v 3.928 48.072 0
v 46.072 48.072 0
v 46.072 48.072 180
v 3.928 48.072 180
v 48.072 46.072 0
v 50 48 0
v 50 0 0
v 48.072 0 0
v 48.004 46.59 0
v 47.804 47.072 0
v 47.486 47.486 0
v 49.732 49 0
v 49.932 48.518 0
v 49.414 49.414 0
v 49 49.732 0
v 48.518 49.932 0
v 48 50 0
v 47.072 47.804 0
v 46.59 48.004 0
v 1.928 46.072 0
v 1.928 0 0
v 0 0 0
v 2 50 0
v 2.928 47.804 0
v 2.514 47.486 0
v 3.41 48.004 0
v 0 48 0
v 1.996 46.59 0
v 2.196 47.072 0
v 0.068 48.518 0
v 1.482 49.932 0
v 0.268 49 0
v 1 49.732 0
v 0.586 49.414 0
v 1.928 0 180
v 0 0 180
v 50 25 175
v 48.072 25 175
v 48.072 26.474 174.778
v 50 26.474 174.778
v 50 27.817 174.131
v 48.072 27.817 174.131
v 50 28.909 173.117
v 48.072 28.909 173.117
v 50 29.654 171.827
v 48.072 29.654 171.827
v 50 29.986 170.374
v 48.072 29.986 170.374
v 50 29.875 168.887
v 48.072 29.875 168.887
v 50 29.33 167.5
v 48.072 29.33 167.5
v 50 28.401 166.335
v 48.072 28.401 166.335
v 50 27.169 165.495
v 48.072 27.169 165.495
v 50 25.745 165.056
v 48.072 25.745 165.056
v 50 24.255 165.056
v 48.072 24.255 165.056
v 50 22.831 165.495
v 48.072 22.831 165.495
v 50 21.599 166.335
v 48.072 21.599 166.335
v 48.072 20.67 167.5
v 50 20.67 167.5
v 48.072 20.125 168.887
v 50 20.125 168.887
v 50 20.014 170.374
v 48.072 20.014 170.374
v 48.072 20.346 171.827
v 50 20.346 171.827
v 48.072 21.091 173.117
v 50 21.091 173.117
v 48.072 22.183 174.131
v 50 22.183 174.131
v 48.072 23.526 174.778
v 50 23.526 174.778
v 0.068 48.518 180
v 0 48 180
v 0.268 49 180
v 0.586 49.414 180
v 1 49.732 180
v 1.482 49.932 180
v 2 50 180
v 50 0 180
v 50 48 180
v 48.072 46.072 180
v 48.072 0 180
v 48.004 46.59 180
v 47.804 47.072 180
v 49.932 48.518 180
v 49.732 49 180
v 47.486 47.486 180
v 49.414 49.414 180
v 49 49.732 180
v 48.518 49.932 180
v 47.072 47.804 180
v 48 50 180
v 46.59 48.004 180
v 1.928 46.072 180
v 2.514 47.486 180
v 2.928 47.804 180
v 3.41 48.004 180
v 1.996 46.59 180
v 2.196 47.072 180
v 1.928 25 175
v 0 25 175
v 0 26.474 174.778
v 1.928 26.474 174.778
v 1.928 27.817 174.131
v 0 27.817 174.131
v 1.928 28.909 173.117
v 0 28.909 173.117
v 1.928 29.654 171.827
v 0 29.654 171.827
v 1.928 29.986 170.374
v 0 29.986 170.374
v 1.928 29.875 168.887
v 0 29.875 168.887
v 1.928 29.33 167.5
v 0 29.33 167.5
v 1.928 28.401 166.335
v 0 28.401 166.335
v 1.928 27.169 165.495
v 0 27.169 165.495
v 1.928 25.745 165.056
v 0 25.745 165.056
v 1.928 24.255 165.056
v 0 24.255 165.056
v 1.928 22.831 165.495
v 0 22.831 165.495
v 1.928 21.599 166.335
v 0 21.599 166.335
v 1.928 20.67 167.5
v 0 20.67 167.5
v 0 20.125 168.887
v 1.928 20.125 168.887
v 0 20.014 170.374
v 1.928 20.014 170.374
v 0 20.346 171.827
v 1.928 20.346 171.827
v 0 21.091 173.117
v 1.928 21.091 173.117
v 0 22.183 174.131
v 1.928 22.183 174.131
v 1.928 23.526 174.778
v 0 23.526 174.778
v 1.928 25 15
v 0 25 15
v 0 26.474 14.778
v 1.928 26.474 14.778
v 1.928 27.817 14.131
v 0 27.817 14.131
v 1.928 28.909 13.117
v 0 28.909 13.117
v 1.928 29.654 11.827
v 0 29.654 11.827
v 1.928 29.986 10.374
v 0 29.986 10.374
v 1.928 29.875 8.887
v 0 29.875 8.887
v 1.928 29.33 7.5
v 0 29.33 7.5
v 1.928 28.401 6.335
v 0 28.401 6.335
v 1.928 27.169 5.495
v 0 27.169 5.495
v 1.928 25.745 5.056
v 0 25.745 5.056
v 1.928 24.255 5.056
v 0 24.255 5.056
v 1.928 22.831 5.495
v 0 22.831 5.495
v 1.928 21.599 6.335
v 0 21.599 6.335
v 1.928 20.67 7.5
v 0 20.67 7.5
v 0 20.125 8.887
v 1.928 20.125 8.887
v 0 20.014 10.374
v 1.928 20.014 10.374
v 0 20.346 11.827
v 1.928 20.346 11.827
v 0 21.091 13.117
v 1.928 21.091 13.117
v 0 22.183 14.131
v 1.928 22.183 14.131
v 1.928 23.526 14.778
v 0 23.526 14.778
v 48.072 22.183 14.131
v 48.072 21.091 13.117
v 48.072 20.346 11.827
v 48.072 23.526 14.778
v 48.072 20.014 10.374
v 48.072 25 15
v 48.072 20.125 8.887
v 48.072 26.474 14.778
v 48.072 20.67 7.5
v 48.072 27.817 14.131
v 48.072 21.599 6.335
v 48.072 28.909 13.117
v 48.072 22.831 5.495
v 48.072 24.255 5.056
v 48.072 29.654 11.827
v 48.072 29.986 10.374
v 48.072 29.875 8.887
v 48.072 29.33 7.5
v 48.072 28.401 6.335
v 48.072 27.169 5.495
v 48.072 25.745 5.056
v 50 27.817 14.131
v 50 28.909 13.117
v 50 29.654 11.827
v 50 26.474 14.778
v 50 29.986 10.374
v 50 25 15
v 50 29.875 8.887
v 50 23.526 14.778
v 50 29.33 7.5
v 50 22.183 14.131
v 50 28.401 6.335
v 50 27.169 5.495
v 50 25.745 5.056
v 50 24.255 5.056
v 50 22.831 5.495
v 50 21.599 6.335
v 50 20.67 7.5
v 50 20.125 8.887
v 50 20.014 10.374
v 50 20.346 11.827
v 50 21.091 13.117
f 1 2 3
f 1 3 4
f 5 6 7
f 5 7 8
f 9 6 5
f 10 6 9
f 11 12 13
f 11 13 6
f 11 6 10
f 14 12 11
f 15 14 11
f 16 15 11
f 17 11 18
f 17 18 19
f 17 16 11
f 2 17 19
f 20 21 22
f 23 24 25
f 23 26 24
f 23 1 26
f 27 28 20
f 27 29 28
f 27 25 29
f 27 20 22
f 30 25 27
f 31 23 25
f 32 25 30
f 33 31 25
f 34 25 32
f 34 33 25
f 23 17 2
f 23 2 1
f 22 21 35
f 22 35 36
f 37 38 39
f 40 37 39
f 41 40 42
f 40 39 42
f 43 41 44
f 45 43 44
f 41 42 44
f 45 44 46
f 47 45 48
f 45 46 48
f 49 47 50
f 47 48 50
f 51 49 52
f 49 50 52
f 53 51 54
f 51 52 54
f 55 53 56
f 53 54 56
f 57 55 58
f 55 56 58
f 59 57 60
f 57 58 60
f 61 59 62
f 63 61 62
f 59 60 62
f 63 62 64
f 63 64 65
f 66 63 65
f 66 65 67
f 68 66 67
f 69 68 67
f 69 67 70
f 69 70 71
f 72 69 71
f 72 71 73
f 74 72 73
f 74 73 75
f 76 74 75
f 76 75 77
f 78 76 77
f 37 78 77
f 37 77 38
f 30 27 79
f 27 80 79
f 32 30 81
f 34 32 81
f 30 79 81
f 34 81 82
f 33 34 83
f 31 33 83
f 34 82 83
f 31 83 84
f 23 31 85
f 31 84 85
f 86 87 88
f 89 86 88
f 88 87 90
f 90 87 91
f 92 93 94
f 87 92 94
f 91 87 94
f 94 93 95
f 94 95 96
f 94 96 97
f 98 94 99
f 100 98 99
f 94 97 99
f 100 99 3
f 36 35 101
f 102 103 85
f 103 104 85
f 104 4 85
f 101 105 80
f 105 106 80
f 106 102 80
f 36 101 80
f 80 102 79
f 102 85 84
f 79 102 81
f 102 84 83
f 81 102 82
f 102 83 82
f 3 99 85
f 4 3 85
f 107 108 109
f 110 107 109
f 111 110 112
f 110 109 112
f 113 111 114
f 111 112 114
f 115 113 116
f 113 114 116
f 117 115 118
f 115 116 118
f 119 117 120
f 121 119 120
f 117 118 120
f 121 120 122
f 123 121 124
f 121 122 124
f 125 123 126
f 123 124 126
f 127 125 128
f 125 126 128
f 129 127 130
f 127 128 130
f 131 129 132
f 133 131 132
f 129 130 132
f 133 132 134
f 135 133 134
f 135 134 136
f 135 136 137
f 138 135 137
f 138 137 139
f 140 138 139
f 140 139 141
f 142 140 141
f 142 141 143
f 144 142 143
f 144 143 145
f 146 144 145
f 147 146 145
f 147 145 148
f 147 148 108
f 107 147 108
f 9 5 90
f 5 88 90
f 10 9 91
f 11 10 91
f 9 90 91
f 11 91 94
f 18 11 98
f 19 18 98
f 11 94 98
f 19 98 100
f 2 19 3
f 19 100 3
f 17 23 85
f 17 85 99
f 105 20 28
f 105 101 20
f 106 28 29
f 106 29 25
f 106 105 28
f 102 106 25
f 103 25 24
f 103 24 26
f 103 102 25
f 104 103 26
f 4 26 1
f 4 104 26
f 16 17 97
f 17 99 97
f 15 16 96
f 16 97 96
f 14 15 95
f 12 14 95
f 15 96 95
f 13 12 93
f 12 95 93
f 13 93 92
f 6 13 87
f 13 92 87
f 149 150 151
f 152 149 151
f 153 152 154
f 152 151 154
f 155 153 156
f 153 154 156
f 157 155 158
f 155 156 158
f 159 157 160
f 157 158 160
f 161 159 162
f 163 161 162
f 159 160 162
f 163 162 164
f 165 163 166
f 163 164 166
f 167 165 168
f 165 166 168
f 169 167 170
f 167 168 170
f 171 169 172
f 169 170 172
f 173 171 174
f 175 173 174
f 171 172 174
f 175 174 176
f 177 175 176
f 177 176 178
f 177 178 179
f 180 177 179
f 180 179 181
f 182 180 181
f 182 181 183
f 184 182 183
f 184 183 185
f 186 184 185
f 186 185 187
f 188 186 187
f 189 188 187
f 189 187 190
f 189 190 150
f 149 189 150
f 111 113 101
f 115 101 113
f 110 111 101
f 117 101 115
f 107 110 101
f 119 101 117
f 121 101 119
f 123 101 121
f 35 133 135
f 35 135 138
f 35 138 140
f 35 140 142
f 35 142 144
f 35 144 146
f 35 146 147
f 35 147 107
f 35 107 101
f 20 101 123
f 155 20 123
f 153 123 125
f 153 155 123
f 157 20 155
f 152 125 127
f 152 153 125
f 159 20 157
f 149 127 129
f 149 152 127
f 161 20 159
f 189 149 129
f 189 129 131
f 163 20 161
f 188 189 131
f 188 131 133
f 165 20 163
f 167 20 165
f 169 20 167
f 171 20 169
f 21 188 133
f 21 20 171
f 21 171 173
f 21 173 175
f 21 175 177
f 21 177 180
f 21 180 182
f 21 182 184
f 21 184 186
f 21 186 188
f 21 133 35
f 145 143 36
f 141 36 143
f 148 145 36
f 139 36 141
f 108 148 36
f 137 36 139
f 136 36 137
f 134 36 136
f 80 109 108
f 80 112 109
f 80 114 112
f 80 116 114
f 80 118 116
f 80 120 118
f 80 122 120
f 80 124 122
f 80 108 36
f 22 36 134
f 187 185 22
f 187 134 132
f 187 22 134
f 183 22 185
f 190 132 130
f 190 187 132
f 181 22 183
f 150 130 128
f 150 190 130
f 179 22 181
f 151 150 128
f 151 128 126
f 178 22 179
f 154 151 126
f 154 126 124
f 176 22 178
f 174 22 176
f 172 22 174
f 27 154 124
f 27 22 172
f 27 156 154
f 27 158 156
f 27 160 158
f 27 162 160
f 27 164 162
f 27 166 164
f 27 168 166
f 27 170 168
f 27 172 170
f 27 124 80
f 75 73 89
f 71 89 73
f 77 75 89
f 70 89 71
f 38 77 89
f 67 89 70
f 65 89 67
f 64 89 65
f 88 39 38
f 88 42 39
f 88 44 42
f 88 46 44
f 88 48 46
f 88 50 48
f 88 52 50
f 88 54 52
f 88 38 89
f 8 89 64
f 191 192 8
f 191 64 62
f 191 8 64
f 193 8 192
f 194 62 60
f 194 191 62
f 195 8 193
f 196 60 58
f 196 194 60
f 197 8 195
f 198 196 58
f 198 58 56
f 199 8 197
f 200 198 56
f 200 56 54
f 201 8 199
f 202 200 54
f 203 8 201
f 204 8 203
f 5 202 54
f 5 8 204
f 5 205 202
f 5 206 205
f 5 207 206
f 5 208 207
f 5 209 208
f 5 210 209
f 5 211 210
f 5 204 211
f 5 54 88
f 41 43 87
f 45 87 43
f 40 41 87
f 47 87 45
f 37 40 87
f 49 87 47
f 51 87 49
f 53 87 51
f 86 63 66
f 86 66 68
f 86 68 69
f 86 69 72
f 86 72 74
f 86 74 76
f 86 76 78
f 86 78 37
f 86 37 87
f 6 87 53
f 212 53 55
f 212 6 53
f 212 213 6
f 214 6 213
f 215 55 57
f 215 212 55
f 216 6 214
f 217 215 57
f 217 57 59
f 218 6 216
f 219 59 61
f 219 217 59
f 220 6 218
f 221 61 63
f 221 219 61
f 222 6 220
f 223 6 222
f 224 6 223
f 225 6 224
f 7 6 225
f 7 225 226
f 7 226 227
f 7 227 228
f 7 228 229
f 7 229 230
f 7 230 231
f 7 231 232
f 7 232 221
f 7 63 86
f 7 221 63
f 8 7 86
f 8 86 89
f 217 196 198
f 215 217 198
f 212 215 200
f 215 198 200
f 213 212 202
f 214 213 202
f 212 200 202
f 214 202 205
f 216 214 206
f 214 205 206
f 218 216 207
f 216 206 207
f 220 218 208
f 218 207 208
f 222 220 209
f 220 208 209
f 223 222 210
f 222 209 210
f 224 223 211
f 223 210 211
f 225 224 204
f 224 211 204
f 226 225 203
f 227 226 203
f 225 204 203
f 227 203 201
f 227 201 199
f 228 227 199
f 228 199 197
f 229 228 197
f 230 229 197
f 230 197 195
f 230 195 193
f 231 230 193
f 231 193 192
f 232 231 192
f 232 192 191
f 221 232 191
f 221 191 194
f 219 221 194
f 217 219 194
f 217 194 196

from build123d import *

# Parameters (mm, degrees)
BOSS_EXTRUDE1_DEPTH = 180
SKETCH2_R           = 5
CUT_EXTRUDE1_DEPTH  = 194.390796058
FILLET1_R           = 2


with BuildPart() as part:
    # Sketch1 → Boss-Extrude1 (new body)
    with BuildSketch(Plane.XY):
        Polygon((0, 0), (0, 50), (50, 50), (50, 0), (48.07222, 0), (48.07222, 48.07222), (1.92778, 48.07222), (1.92778, 0), align=None)
    extrude(amount=BOSS_EXTRUDE1_DEPTH)

    # Sketch2 → Cut-Extrude1 (cut, through all)
    with BuildSketch(Plane.ZY):
        with Locations((10, 25)):
            Circle(SKETCH2_R)
        with Locations((170, 25)):
            Circle(SKETCH2_R)
    extrude(amount=-CUT_EXTRUDE1_DEPTH, mode=Mode.SUBTRACT)

    # Fillet1
    fillet1_edges = [part.edges().sort_by_distance(p)[0] for p in [
        (0, 50, 90),
        (50, 50, 90),
        (48.07222, 48.07222, 90),
        (1.92778, 48.07222, 90),
    ]]
    fillet(fillet1_edges, radius=FILLET1_R)


solid = part.part
